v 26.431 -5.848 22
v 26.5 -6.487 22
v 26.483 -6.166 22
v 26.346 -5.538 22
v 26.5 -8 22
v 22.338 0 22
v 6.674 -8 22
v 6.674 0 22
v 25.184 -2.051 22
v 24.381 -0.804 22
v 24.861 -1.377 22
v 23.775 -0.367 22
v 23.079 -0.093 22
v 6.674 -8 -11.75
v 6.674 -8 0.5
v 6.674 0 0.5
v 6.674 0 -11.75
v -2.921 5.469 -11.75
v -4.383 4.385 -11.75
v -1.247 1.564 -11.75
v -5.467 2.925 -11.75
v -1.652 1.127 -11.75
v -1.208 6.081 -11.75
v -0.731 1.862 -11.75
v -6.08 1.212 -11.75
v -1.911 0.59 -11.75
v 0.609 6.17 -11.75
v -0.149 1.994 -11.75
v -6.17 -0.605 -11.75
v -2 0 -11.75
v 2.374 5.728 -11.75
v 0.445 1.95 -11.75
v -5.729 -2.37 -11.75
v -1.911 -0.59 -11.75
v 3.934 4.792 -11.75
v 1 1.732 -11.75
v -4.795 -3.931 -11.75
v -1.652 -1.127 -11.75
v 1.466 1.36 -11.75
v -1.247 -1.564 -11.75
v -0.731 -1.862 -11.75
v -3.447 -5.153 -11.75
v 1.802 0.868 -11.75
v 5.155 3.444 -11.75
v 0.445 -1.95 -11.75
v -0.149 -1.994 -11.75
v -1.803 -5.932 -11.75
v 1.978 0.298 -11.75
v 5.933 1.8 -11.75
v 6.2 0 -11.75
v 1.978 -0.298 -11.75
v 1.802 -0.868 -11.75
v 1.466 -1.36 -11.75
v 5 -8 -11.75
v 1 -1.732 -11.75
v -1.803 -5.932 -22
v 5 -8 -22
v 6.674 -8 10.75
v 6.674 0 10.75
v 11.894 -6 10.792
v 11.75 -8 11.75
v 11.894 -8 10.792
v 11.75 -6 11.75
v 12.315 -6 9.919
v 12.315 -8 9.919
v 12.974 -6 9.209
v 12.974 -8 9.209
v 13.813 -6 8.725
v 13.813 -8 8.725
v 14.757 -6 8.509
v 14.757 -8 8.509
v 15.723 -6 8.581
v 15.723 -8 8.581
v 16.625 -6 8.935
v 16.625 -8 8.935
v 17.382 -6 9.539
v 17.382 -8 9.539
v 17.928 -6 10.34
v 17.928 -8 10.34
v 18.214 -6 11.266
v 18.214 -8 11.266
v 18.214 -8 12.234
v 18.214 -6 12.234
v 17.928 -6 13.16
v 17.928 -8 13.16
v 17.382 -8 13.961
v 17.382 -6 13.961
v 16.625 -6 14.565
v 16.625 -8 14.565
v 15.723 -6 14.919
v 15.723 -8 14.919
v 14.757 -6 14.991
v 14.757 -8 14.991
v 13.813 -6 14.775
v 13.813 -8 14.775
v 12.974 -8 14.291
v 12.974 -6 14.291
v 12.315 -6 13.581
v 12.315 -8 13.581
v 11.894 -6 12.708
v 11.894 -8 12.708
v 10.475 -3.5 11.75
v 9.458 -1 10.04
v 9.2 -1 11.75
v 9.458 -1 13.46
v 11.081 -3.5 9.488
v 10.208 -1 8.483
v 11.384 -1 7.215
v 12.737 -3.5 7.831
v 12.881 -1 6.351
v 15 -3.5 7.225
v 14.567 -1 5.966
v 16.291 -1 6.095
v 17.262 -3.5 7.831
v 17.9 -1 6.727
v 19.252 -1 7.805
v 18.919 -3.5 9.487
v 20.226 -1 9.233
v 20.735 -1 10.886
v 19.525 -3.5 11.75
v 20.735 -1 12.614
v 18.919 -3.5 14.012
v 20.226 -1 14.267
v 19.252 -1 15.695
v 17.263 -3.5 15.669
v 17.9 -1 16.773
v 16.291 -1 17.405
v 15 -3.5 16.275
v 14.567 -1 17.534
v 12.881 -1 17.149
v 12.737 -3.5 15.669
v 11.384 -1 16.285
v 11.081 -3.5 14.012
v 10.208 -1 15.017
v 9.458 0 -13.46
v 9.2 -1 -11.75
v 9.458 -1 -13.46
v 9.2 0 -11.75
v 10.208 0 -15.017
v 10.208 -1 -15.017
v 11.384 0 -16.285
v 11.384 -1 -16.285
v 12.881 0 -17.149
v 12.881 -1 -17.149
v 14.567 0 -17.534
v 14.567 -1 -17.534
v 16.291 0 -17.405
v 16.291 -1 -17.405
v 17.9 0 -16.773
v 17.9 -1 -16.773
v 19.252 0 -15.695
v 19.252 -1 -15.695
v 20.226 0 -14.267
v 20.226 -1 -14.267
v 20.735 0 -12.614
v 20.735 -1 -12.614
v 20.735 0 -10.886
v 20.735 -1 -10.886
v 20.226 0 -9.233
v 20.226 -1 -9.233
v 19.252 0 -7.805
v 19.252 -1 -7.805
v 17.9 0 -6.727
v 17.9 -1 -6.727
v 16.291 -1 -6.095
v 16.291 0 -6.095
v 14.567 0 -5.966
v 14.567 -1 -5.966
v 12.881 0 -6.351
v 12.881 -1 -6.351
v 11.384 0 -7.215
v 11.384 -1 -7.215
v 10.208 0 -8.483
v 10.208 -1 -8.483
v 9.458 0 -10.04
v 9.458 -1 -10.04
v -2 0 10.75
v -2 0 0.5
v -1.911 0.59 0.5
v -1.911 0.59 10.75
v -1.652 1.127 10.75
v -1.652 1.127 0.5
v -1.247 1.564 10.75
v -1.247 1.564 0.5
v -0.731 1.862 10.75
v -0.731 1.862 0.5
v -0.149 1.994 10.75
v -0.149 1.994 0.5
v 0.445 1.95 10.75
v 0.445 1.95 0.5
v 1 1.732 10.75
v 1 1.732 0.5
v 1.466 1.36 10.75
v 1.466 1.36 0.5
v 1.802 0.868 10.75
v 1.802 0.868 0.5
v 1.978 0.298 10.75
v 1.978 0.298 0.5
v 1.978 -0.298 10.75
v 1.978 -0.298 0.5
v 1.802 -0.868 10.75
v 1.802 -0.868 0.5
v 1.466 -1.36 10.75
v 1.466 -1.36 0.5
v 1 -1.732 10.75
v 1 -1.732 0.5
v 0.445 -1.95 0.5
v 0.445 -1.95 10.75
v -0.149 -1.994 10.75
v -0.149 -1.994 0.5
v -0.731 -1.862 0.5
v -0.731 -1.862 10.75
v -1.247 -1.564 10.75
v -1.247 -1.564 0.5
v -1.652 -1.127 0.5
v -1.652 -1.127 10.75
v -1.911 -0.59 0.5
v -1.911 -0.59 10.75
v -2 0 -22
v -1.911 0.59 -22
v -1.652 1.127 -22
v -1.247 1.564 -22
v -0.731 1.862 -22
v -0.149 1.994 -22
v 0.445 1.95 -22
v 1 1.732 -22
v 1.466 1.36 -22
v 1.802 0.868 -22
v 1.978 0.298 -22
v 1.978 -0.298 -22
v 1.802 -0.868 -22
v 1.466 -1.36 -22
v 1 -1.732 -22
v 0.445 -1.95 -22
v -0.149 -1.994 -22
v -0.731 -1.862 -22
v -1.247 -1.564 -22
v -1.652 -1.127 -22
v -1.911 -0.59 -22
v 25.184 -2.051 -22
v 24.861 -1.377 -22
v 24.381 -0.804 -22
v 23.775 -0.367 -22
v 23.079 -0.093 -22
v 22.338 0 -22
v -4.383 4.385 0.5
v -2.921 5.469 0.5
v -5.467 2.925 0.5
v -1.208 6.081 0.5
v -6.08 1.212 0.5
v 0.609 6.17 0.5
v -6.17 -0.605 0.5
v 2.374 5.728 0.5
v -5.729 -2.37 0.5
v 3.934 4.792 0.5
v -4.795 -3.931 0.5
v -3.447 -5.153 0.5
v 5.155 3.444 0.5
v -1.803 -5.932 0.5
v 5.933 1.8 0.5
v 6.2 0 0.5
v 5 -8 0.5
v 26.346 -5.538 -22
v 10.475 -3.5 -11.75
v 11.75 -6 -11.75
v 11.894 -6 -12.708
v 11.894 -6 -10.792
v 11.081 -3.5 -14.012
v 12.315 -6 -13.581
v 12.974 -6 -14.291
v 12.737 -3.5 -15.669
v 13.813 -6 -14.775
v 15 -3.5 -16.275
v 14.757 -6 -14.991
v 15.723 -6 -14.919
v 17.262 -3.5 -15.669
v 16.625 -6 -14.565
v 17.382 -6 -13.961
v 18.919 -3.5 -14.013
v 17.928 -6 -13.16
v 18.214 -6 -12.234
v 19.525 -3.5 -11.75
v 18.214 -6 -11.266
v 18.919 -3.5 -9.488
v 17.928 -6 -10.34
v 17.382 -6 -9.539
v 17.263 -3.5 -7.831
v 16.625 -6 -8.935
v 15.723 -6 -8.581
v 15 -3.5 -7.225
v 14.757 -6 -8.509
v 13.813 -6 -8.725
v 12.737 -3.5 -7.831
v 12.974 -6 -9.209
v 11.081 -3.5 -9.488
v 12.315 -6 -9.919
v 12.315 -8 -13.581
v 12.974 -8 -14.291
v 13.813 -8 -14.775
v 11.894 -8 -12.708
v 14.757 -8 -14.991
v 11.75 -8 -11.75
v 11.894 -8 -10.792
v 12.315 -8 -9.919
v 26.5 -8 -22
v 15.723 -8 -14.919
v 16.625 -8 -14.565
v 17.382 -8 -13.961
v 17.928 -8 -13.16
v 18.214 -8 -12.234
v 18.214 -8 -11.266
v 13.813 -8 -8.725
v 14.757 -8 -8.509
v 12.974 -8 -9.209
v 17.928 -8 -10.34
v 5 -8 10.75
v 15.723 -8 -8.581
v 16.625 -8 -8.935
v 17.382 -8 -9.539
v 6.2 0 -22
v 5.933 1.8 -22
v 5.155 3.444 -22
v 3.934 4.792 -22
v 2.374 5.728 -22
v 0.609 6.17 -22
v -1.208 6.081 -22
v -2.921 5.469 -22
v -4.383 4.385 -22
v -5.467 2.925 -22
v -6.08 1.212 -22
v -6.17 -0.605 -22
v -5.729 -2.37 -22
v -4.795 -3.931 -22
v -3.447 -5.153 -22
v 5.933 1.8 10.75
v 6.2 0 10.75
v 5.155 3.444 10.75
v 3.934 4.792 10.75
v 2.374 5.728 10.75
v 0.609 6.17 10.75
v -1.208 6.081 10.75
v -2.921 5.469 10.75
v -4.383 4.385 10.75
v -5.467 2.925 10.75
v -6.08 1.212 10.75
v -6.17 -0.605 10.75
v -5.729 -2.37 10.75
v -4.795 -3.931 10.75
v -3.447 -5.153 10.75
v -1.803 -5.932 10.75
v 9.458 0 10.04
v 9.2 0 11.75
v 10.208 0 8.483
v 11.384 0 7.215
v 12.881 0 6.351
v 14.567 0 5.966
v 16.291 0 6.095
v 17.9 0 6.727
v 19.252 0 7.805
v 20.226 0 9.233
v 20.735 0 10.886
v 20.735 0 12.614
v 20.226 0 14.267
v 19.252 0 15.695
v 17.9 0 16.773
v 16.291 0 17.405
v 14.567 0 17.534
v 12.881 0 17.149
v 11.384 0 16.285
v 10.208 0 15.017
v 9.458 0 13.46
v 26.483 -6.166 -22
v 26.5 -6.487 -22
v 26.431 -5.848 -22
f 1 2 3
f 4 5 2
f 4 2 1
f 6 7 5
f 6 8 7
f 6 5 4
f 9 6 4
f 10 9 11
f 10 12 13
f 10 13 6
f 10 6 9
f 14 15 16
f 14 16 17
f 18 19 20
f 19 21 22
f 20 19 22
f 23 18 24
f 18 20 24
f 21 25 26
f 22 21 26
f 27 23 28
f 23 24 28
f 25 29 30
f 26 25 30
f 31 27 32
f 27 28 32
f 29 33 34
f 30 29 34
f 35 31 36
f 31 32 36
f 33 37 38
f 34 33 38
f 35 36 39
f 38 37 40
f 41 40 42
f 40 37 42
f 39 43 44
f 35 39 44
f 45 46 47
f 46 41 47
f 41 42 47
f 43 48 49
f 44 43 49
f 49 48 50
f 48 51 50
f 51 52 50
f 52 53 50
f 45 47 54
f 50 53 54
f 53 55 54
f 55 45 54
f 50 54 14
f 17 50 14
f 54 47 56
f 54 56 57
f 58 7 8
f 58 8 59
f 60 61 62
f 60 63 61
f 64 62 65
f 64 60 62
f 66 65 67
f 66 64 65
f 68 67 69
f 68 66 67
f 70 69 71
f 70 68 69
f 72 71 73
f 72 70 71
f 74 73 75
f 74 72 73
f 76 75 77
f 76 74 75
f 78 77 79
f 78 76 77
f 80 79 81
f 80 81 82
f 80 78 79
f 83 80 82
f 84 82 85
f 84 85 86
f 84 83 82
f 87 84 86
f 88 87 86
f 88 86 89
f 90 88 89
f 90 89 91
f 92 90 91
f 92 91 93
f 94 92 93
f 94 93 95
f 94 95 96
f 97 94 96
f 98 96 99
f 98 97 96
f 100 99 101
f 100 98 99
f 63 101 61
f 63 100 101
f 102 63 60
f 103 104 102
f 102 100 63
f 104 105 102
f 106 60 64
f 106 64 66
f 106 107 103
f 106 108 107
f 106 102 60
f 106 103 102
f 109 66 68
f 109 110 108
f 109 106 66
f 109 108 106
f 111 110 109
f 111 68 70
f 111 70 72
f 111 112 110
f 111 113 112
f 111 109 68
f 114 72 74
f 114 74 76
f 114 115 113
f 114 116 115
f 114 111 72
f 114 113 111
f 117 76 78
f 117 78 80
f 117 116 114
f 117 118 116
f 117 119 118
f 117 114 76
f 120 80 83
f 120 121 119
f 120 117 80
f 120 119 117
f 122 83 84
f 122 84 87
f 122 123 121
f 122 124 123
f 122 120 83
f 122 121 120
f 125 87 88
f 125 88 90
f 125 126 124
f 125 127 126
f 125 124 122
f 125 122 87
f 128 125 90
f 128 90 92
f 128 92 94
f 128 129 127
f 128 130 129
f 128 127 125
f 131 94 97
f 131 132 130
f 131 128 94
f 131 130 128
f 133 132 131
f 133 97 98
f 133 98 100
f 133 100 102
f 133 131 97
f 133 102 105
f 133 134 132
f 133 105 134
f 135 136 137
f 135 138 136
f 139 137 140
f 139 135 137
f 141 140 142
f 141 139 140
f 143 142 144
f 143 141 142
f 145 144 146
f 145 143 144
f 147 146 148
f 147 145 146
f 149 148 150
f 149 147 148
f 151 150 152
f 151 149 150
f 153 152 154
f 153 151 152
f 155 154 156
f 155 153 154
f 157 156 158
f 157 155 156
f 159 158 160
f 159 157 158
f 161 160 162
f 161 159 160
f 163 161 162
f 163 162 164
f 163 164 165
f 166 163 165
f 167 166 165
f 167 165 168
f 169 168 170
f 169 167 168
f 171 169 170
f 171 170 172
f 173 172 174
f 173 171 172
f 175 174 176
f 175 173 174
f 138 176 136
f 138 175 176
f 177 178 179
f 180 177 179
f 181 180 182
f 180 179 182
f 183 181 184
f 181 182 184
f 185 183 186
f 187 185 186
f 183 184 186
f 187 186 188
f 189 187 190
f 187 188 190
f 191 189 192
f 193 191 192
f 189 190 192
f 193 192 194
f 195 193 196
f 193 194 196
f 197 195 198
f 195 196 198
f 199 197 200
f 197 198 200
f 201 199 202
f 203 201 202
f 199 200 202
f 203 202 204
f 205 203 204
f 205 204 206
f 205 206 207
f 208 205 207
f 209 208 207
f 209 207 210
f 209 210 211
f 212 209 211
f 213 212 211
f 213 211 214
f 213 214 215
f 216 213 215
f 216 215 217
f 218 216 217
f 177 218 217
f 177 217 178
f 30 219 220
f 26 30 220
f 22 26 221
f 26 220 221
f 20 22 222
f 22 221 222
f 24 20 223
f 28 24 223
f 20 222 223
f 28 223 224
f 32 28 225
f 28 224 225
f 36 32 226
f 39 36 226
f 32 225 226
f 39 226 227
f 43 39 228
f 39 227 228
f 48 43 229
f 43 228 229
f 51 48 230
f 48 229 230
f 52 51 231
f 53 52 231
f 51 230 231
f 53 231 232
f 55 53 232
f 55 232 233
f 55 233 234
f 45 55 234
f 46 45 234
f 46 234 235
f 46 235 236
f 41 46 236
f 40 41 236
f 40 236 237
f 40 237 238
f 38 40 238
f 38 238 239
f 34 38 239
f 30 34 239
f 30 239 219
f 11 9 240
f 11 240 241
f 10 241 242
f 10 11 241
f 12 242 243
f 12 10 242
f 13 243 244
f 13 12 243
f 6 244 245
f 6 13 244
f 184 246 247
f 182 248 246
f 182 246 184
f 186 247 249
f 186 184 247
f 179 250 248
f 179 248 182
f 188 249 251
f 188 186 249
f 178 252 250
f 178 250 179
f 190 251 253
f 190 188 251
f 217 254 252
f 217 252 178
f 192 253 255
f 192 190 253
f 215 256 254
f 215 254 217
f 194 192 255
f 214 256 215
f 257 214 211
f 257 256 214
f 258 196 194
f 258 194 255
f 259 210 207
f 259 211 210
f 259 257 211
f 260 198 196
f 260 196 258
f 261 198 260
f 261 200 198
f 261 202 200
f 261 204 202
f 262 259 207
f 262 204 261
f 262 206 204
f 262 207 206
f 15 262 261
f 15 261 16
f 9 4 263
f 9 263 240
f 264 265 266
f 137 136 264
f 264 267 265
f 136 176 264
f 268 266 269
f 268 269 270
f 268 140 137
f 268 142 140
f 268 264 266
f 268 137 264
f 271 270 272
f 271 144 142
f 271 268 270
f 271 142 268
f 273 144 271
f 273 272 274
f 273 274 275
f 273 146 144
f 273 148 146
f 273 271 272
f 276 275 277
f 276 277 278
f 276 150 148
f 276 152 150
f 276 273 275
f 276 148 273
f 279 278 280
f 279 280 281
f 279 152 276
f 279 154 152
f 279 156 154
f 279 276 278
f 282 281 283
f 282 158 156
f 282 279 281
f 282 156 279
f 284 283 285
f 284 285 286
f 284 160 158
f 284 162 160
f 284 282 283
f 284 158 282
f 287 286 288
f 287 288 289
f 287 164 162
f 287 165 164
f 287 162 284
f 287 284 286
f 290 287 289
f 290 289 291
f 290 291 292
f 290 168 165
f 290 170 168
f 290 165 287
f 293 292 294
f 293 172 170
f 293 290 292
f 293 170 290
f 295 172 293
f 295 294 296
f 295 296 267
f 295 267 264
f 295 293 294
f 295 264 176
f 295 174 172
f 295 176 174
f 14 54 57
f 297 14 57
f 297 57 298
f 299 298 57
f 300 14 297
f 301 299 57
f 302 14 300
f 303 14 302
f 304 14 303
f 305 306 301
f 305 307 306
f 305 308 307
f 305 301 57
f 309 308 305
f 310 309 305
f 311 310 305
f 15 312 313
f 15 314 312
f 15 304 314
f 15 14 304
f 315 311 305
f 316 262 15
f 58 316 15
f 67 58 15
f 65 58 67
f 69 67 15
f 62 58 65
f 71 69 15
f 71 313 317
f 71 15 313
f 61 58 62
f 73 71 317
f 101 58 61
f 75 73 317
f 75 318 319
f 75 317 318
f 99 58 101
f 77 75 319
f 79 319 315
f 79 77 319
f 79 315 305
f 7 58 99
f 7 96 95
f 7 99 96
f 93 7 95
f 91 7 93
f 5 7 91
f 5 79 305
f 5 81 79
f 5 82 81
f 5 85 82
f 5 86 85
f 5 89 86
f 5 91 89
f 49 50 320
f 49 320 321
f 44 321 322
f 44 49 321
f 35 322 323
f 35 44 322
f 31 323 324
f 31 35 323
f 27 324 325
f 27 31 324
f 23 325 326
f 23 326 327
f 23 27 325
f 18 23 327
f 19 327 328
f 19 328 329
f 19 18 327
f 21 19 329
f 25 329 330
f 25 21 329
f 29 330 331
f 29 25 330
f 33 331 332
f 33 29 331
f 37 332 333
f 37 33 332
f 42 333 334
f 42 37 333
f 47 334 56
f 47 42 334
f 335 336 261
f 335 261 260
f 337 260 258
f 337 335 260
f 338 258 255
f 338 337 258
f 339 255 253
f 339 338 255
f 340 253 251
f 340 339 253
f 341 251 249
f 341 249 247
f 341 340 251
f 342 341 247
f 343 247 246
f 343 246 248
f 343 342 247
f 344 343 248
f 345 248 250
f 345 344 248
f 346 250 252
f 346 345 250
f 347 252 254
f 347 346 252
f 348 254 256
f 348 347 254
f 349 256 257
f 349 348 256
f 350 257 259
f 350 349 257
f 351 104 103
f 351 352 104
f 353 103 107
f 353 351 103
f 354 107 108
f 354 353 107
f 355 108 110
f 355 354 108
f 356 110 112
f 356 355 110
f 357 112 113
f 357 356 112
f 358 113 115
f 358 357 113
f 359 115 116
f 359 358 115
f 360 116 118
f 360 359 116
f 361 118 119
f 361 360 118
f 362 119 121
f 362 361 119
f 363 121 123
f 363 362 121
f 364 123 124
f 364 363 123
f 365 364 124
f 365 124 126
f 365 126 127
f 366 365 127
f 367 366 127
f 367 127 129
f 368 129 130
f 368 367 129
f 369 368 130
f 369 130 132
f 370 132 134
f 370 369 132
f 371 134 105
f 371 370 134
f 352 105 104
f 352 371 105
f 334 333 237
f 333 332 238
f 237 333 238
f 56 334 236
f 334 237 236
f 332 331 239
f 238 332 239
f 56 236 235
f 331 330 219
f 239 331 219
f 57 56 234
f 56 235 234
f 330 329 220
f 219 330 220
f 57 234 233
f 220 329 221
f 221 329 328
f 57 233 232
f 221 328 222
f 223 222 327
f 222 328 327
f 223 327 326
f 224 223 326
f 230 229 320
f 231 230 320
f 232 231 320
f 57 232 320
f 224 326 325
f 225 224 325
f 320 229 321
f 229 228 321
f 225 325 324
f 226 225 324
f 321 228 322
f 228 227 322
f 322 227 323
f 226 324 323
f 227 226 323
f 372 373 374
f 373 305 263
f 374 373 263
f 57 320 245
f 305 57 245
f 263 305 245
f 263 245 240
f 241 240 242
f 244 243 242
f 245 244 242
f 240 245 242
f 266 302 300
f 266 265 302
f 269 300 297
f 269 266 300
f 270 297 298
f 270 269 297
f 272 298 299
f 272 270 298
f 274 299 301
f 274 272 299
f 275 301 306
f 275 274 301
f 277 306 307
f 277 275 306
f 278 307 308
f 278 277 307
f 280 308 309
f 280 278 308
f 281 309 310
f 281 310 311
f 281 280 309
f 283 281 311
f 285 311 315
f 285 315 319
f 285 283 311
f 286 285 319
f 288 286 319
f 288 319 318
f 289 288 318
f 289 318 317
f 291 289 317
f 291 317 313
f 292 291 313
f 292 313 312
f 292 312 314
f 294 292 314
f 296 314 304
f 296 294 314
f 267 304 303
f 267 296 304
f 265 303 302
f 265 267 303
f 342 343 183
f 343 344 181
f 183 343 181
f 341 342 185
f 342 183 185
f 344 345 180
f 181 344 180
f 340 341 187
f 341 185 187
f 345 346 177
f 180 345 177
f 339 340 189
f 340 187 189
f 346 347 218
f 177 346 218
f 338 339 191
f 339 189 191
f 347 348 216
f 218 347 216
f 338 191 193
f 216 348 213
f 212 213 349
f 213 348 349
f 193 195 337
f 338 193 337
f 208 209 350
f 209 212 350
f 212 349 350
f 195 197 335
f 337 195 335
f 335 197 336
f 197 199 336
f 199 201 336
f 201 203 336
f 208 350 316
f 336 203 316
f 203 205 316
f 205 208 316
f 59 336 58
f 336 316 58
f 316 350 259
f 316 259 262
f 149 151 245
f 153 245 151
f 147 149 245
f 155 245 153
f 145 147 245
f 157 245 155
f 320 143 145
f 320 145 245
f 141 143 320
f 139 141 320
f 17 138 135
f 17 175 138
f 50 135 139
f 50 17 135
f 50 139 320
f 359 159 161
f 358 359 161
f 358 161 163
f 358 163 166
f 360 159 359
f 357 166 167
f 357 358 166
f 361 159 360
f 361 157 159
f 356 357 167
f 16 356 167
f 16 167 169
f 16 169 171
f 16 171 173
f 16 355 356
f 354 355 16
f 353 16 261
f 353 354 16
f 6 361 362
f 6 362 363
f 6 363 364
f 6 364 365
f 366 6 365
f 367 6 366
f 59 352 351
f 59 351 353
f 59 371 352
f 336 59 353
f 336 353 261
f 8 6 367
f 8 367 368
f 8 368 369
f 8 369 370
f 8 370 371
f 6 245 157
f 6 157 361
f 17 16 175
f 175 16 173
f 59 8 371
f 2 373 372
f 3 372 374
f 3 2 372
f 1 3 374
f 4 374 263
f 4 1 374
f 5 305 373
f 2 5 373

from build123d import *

# Parameters (mm, degrees)
EXTRUDE_1_DEPTH          = 22
CUT_EXTRUDE_1_DEPTH      = 36.358874416
CUT_EXTRUDE_1_DEPTH_BACK = 36.358874416
SKETCH_3_W               = 15.710666492
SKETCH_3_H               = 11.25
SKETCH_3_W_2             = 17.010469835
SKETCH_3_H_2             = 12.25
SKETCH_4_R               = 2
CUT_EXTRUDE_2_DEPTH      = 52.983170353
PATTERN_LINEAR_1_COUNT   = 2
PATTERN_LINEAR_1_PITCH   = 23.5


with BuildPart() as part:
    # 草图1 → 凸台-拉伸1 (new, symmetric)
    with BuildSketch(Plane.XY):
        with BuildLine():
            Line((26.5, -8), (26.5, -6.486832981))
            ThreePointArc((26.5, -6.486832981), (26.461262373, -6.006286251), (26.346049894, -5.538149682))
            Line((26.346049894, -5.538149682), (25.183772234, -2.051316702))
            ThreePointArc((25.183772234, -2.051316702), (24.091853194, -0.566273444), (22.33772234, 0))
            Line((22.33772234, 0), (6.2, 0))
            ThreePointArc((6.2, 0), (-3.691899698, 4.980951377), (-1.803186005, -5.931991253))
            Line((-1.803186005, -5.931991253), (5, -8))
            Line((5, -8), (26.5, -8))
        make_face()
    extrude(amount=EXTRUDE_1_DEPTH, both=True)

    # 草图3 → 切除-拉伸1 (cut, two sides: drawn at the far end of the back side and taken through both)
    with BuildSketch(Plane(origin=(0, 0, 0), x_dir=(1, 0, 0), z_dir=(0, 1, 0)).offset(-CUT_EXTRUDE_1_DEPTH_BACK)):
        with Locations((-1.180894358, -16.375)):
            Rectangle(SKETCH_3_W, SKETCH_3_H)
        with Locations((-1.83079603, 5.625)):
            Rectangle(SKETCH_3_W_2, SKETCH_3_H_2)
    extrude(amount=CUT_EXTRUDE_1_DEPTH + CUT_EXTRUDE_1_DEPTH_BACK, mode=Mode.SUBTRACT)

    # 草图4 → 切除-拉伸2 (cut, through all)
    with BuildSketch(Plane(origin=(0, 0, -22), x_dir=(-1, 0, 0), z_dir=(0, 0, -1))):
        Circle(SKETCH_4_R)
    extrude(amount=-CUT_EXTRUDE_2_DEPTH, mode=Mode.SUBTRACT)

    # 草图5 → 切除-旋转1 (revolve, cut)
    with BuildSketch(Plane(origin=(0, 0, -11.75), x_dir=(-1, 0, 0), z_dir=(0, 0, -1))):
        Polygon((-15, 0), (-15, -8), (-11.75, -8), (-11.75, -6), (-9.2, -1), (-9.2, 0), align=None)
    cut_revolve_1 = revolve(axis=Axis((15, 0, -11.75), (0, -1, 0)), mode=Mode.SUBTRACT)

    # 阵列(线性)1: 切除-旋转1 ×2
    with Locations(*[(0, 0, i * PATTERN_LINEAR_1_PITCH) for i in range(1, PATTERN_LINEAR_1_COUNT)]):
        add(cut_revolve_1, mode=Mode.SUBTRACT)


solid = part.part
